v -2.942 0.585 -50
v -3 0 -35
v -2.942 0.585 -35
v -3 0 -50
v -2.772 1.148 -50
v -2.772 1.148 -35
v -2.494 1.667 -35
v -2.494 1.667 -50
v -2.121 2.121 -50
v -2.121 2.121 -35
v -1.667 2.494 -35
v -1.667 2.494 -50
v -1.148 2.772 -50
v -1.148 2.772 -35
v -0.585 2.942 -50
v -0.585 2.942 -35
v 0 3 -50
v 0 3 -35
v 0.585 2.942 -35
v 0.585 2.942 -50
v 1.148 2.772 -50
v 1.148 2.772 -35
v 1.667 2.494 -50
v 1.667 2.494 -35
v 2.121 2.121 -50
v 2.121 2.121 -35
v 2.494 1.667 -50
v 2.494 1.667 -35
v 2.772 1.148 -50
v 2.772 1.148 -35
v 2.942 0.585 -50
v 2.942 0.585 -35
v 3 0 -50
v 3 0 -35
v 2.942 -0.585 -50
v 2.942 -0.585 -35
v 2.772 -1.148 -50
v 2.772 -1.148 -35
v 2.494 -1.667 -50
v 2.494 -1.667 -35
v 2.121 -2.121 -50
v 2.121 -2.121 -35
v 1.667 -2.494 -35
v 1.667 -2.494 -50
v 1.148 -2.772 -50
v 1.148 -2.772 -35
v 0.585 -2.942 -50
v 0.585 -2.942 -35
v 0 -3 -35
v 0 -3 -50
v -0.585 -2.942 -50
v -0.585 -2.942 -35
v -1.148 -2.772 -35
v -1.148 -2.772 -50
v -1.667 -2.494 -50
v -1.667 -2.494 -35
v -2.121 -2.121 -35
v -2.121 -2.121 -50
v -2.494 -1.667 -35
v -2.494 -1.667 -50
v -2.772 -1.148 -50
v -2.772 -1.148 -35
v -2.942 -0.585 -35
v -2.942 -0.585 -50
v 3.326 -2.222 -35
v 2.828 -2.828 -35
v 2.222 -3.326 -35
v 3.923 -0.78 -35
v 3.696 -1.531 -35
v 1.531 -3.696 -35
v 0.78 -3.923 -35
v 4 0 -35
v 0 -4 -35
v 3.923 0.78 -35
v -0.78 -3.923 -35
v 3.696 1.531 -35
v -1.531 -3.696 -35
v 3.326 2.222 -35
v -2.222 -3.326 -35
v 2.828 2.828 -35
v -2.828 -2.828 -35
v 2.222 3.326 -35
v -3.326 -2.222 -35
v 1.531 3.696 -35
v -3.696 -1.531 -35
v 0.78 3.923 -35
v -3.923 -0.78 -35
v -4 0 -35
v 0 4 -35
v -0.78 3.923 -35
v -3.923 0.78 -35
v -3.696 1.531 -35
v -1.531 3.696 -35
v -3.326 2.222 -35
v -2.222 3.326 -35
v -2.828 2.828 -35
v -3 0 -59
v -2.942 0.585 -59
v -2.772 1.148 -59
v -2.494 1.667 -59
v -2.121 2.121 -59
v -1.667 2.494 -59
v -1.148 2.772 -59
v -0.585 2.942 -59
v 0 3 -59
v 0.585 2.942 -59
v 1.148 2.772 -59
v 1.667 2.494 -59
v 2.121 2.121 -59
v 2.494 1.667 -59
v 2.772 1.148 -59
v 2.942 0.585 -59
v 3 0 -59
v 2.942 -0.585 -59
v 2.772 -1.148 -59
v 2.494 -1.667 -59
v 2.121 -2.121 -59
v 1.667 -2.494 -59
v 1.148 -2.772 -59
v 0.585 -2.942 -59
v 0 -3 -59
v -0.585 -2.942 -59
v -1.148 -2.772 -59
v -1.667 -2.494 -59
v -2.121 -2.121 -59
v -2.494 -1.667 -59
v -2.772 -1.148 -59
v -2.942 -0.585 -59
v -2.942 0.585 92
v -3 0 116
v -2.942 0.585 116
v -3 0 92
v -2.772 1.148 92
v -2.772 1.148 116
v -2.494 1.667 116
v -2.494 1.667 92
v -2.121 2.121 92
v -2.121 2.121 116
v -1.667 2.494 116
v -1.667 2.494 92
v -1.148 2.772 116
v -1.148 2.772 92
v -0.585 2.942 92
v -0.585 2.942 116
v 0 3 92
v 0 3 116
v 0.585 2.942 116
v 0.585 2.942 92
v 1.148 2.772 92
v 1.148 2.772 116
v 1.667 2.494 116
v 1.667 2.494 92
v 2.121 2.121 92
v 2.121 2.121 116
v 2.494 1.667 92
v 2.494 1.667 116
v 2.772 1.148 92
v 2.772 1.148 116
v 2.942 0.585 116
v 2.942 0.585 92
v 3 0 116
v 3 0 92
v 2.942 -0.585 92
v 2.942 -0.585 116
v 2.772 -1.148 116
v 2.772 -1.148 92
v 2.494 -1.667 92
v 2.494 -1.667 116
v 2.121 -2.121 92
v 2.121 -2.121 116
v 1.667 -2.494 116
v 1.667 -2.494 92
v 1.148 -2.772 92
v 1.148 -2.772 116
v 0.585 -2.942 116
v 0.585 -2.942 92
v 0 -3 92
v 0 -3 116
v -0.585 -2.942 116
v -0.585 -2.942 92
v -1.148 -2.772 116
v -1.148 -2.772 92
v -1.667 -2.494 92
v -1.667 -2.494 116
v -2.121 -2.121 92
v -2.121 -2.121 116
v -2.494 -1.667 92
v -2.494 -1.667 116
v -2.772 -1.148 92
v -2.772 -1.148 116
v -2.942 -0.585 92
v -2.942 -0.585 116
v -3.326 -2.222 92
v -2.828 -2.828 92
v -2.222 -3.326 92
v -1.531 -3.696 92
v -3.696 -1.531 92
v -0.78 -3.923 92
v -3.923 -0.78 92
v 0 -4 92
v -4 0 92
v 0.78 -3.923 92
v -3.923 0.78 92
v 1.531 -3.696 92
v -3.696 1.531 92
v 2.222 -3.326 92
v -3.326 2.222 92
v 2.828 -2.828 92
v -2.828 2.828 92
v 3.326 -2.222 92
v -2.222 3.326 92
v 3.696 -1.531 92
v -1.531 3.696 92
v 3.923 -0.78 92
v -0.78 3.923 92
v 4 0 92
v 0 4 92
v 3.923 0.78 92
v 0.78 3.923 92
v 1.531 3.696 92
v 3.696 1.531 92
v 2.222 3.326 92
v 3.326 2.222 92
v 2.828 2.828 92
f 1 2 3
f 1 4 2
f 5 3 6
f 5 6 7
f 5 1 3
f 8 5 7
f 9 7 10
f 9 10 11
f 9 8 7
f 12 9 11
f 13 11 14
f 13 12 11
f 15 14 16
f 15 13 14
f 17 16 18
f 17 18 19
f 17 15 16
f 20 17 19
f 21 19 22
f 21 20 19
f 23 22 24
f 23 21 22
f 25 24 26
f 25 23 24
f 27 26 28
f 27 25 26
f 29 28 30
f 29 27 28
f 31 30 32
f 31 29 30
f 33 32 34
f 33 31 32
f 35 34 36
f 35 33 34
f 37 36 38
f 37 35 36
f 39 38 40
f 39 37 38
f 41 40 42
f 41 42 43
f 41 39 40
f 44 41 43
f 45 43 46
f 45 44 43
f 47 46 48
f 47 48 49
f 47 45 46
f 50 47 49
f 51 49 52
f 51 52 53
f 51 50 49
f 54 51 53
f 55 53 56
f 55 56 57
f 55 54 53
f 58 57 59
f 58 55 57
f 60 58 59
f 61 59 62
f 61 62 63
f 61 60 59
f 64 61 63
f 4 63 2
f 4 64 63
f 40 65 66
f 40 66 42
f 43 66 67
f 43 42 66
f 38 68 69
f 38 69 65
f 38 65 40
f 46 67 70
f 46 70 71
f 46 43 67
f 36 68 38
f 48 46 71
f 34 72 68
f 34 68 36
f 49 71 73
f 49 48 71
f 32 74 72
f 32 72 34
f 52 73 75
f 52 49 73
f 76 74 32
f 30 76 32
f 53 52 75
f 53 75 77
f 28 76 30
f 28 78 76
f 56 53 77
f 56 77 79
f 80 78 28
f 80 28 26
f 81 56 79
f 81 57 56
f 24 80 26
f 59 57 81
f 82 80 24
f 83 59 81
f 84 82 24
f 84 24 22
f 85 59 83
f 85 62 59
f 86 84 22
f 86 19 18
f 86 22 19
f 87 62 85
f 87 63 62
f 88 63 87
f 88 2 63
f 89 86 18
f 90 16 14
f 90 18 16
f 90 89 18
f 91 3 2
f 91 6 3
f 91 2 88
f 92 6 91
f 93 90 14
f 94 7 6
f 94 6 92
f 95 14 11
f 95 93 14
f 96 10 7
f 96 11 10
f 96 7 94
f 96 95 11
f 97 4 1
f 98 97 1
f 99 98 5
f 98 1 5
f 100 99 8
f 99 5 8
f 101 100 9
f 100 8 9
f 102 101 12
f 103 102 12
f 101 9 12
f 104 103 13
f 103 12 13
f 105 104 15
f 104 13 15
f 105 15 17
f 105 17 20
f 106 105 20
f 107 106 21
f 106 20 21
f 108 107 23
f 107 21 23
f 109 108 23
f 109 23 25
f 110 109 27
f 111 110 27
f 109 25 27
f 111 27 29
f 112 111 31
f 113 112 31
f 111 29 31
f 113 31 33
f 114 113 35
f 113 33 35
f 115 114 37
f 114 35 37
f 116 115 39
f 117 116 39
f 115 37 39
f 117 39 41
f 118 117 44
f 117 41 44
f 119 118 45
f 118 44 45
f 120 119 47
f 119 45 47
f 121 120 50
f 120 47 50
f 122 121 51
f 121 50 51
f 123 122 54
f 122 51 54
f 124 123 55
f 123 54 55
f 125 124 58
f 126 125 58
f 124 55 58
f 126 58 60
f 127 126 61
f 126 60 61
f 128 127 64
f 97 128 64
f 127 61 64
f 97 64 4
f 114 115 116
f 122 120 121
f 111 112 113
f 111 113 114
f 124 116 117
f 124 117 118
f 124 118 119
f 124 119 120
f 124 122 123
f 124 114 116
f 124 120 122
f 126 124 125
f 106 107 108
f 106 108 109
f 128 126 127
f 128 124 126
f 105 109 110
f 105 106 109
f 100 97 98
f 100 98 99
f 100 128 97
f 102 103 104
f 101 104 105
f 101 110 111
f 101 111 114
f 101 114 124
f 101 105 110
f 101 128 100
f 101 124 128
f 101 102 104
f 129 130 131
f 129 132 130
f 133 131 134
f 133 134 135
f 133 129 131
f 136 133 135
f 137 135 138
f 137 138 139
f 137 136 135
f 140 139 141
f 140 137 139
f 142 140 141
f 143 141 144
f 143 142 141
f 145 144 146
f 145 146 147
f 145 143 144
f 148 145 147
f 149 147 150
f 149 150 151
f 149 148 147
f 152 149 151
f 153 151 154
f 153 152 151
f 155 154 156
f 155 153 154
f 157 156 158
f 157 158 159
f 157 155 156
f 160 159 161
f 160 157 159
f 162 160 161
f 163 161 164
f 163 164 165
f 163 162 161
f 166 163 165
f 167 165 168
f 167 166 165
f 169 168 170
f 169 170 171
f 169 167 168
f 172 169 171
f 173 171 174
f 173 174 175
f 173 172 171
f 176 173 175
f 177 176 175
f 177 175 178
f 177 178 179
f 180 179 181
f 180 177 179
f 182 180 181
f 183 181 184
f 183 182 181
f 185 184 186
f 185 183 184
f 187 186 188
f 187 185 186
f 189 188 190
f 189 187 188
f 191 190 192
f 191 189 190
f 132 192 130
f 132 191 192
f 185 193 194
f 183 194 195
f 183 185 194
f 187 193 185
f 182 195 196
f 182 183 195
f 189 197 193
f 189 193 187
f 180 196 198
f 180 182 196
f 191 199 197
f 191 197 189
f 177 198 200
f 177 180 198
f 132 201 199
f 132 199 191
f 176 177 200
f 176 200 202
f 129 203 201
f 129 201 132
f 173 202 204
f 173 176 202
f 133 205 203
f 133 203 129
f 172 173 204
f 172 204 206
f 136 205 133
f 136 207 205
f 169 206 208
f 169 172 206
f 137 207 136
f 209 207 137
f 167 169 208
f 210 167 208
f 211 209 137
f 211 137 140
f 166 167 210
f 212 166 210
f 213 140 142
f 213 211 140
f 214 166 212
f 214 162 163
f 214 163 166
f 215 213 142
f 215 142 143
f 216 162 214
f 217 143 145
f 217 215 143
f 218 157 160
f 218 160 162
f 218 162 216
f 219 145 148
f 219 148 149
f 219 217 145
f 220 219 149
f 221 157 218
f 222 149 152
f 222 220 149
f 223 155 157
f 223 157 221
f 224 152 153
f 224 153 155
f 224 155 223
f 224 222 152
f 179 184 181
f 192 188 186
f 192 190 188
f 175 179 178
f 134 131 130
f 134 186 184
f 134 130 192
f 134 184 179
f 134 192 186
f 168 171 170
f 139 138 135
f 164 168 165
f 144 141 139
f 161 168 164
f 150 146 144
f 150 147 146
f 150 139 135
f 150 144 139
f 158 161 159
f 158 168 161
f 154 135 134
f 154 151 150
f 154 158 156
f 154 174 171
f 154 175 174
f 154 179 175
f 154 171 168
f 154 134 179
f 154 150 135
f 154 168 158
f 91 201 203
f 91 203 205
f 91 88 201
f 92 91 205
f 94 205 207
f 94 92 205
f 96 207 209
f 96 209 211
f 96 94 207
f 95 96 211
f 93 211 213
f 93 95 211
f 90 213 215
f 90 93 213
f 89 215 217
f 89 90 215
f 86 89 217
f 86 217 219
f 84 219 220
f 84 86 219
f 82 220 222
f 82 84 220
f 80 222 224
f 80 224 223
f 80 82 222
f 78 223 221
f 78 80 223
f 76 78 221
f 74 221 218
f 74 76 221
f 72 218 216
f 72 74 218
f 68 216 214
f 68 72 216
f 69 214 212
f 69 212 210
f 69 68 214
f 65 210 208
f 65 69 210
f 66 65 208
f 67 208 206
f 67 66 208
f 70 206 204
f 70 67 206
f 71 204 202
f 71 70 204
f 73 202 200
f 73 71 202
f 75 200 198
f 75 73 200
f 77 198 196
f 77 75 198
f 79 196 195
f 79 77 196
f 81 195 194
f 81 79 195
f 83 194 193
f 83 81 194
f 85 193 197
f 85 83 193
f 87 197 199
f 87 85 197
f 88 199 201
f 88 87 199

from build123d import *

# Parameters (mm, degrees)
F2_DEPTH = 9
F3_DEPTH = 9


with BuildPart() as f1:
    # F0 (on Front) → F1 (revolve)
    with BuildSketch(Plane.XZ):
        Polygon((0, -50), (0, 107), (-3, 107), (-3, 92), (-4, 92), (-4, -35), (-3, -35), (-3, -50), align=None)
    revolve(axis=Axis((0, 0, 0), (0, 0, -1)))

    # F2 (add): a face of the model
    f2_faces = [f1.faces().sort_by_distance(p)[0] for p in [
        (0, 0, 107),
    ]]
    extrude(f2_faces, amount=F2_DEPTH)

    # F3 (add): a face of the model
    f3_faces = [f1.faces().sort_by_distance(p)[0] for p in [
        (0, 0, -50),
    ]]
    extrude(f3_faces, amount=F3_DEPTH)


solid = f1.part
